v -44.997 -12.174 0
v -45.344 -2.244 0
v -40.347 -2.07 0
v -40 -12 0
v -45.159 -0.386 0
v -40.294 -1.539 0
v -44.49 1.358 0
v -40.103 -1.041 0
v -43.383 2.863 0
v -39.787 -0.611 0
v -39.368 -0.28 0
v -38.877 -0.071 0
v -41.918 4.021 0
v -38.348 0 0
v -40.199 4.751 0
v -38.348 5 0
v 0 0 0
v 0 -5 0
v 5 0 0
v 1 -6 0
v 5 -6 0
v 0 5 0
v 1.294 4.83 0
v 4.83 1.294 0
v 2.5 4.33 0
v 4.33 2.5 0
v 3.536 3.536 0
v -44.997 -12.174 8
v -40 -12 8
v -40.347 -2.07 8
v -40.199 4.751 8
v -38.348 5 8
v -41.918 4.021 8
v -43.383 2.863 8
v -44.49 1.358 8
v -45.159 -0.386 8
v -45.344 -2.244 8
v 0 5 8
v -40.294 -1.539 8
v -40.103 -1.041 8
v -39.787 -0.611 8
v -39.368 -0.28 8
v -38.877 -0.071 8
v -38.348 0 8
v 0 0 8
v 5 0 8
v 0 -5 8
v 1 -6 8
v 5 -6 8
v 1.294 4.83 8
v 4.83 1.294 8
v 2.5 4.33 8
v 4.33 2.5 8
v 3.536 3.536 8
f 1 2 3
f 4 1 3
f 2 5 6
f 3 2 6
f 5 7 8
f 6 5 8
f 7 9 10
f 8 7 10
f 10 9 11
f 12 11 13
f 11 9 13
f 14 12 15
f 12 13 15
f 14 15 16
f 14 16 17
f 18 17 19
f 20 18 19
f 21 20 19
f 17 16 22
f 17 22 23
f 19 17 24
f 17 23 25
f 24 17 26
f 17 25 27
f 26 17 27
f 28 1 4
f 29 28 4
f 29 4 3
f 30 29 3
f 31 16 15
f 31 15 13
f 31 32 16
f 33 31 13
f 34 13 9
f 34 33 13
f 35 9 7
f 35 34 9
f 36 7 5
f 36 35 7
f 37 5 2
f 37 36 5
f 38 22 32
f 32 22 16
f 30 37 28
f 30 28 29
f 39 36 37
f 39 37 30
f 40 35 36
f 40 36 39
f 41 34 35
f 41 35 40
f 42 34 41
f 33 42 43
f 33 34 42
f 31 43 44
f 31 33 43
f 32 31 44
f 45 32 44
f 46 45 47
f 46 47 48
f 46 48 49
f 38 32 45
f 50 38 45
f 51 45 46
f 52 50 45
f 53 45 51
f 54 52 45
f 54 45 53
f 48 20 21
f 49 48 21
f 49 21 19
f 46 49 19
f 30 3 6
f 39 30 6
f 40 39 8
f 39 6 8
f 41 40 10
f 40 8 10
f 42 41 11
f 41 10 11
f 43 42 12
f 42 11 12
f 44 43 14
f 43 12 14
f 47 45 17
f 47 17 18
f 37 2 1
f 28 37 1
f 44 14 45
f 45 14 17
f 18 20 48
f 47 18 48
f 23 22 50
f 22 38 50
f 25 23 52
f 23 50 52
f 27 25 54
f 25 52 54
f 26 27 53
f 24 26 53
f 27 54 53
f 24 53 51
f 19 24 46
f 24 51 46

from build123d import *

# Parameters (mm, degrees)
F1_DEPTH = 8
F2_SIZE  = 1
F3_R     = 7
F4_R     = 5


with BuildPart() as f1:
    # F0 (on Top) → F1 (new body)
    with BuildSketch(Plane.XY):
        with BuildLine():
            Line((-44.996954, -12.174497), (-40, -12))
            Line((-40, -12), (-40.34677, -2.069799))
            ThreePointArc((-40.34677, -2.069799), (-39.786668, -0.610683), (-38.347989, 0))
            Line((-38.347989, 0), (0, 0))
            Line((0, 0), (0, -6))
            Line((0, -6), (5, -6))
            Line((5, -6), (5, 5))
            Line((5, 5), (-45.596701, 5))
            Line((-45.596701, 5), (-44.996954, -12.174497))
        make_face()
    extrude(amount=F1_DEPTH)

    # F2
    f2_edges = [f1.edges().sort_by_distance(p)[0] for p in [
        (0, -6, 4),
    ]]
    chamfer(f2_edges, length=F2_SIZE)

    # F3
    f3_edges = [f1.edges().sort_by_distance(p)[0] for p in [
        (-45.596701, 5, 4),
    ]]
    fillet(f3_edges, radius=F3_R)

    # F4
    f4_edges = [f1.edges().sort_by_distance(p)[0] for p in [
        (5, 5, 4),
    ]]
    fillet(f4_edges, radius=F4_R)


solid = f1.part
